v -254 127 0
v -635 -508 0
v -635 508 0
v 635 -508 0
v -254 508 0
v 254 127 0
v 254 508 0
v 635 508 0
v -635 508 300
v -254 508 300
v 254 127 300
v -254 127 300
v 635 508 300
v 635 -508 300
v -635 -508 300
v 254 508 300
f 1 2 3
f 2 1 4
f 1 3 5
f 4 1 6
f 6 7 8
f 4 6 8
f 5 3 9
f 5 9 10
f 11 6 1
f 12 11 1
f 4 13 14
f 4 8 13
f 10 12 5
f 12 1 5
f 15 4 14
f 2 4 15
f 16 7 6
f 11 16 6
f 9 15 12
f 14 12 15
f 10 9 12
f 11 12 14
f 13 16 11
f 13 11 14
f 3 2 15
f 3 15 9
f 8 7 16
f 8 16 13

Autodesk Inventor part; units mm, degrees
ref_plane "YZ Plane" through (0, 0, 0) normal (1, 0, 0) x (0, 1, 0)
ref_plane "XZ Plane" through (0, 0, 0) normal (0, 1, 0) x (-1, 0, 0)
ref_plane "XY Plane" through (0, 0, 0) normal (0, 0, 1) x (1, 0, 0)
sketch "Sketch1" plane through (0, 0, 0) normal (0, 0, 1) x (1, 0, 0)
  line L0 (635, 508) -> (635, -508)
  line L1 (635, -508) -> (-635, -508)
  line L2 (-635, -508) -> (-635, 508)
  line L3 (254, 508) -> (254, 127)
  line L4 (254, 127) -> (-254, 127)
  line L5 (-254, 127) -> (-254, 508)
  line L6 (-635, 508) -> (-254, 508)
  line L7 (254, 508) -> (635, 508)
  point P0 (0, 0)
  dimension "d0" = 1270
  dimension "d1" = 1016
extrude "Extrusion1" add sketch "Sketch1" along normal blind 300
properties part number "051665019_11"
